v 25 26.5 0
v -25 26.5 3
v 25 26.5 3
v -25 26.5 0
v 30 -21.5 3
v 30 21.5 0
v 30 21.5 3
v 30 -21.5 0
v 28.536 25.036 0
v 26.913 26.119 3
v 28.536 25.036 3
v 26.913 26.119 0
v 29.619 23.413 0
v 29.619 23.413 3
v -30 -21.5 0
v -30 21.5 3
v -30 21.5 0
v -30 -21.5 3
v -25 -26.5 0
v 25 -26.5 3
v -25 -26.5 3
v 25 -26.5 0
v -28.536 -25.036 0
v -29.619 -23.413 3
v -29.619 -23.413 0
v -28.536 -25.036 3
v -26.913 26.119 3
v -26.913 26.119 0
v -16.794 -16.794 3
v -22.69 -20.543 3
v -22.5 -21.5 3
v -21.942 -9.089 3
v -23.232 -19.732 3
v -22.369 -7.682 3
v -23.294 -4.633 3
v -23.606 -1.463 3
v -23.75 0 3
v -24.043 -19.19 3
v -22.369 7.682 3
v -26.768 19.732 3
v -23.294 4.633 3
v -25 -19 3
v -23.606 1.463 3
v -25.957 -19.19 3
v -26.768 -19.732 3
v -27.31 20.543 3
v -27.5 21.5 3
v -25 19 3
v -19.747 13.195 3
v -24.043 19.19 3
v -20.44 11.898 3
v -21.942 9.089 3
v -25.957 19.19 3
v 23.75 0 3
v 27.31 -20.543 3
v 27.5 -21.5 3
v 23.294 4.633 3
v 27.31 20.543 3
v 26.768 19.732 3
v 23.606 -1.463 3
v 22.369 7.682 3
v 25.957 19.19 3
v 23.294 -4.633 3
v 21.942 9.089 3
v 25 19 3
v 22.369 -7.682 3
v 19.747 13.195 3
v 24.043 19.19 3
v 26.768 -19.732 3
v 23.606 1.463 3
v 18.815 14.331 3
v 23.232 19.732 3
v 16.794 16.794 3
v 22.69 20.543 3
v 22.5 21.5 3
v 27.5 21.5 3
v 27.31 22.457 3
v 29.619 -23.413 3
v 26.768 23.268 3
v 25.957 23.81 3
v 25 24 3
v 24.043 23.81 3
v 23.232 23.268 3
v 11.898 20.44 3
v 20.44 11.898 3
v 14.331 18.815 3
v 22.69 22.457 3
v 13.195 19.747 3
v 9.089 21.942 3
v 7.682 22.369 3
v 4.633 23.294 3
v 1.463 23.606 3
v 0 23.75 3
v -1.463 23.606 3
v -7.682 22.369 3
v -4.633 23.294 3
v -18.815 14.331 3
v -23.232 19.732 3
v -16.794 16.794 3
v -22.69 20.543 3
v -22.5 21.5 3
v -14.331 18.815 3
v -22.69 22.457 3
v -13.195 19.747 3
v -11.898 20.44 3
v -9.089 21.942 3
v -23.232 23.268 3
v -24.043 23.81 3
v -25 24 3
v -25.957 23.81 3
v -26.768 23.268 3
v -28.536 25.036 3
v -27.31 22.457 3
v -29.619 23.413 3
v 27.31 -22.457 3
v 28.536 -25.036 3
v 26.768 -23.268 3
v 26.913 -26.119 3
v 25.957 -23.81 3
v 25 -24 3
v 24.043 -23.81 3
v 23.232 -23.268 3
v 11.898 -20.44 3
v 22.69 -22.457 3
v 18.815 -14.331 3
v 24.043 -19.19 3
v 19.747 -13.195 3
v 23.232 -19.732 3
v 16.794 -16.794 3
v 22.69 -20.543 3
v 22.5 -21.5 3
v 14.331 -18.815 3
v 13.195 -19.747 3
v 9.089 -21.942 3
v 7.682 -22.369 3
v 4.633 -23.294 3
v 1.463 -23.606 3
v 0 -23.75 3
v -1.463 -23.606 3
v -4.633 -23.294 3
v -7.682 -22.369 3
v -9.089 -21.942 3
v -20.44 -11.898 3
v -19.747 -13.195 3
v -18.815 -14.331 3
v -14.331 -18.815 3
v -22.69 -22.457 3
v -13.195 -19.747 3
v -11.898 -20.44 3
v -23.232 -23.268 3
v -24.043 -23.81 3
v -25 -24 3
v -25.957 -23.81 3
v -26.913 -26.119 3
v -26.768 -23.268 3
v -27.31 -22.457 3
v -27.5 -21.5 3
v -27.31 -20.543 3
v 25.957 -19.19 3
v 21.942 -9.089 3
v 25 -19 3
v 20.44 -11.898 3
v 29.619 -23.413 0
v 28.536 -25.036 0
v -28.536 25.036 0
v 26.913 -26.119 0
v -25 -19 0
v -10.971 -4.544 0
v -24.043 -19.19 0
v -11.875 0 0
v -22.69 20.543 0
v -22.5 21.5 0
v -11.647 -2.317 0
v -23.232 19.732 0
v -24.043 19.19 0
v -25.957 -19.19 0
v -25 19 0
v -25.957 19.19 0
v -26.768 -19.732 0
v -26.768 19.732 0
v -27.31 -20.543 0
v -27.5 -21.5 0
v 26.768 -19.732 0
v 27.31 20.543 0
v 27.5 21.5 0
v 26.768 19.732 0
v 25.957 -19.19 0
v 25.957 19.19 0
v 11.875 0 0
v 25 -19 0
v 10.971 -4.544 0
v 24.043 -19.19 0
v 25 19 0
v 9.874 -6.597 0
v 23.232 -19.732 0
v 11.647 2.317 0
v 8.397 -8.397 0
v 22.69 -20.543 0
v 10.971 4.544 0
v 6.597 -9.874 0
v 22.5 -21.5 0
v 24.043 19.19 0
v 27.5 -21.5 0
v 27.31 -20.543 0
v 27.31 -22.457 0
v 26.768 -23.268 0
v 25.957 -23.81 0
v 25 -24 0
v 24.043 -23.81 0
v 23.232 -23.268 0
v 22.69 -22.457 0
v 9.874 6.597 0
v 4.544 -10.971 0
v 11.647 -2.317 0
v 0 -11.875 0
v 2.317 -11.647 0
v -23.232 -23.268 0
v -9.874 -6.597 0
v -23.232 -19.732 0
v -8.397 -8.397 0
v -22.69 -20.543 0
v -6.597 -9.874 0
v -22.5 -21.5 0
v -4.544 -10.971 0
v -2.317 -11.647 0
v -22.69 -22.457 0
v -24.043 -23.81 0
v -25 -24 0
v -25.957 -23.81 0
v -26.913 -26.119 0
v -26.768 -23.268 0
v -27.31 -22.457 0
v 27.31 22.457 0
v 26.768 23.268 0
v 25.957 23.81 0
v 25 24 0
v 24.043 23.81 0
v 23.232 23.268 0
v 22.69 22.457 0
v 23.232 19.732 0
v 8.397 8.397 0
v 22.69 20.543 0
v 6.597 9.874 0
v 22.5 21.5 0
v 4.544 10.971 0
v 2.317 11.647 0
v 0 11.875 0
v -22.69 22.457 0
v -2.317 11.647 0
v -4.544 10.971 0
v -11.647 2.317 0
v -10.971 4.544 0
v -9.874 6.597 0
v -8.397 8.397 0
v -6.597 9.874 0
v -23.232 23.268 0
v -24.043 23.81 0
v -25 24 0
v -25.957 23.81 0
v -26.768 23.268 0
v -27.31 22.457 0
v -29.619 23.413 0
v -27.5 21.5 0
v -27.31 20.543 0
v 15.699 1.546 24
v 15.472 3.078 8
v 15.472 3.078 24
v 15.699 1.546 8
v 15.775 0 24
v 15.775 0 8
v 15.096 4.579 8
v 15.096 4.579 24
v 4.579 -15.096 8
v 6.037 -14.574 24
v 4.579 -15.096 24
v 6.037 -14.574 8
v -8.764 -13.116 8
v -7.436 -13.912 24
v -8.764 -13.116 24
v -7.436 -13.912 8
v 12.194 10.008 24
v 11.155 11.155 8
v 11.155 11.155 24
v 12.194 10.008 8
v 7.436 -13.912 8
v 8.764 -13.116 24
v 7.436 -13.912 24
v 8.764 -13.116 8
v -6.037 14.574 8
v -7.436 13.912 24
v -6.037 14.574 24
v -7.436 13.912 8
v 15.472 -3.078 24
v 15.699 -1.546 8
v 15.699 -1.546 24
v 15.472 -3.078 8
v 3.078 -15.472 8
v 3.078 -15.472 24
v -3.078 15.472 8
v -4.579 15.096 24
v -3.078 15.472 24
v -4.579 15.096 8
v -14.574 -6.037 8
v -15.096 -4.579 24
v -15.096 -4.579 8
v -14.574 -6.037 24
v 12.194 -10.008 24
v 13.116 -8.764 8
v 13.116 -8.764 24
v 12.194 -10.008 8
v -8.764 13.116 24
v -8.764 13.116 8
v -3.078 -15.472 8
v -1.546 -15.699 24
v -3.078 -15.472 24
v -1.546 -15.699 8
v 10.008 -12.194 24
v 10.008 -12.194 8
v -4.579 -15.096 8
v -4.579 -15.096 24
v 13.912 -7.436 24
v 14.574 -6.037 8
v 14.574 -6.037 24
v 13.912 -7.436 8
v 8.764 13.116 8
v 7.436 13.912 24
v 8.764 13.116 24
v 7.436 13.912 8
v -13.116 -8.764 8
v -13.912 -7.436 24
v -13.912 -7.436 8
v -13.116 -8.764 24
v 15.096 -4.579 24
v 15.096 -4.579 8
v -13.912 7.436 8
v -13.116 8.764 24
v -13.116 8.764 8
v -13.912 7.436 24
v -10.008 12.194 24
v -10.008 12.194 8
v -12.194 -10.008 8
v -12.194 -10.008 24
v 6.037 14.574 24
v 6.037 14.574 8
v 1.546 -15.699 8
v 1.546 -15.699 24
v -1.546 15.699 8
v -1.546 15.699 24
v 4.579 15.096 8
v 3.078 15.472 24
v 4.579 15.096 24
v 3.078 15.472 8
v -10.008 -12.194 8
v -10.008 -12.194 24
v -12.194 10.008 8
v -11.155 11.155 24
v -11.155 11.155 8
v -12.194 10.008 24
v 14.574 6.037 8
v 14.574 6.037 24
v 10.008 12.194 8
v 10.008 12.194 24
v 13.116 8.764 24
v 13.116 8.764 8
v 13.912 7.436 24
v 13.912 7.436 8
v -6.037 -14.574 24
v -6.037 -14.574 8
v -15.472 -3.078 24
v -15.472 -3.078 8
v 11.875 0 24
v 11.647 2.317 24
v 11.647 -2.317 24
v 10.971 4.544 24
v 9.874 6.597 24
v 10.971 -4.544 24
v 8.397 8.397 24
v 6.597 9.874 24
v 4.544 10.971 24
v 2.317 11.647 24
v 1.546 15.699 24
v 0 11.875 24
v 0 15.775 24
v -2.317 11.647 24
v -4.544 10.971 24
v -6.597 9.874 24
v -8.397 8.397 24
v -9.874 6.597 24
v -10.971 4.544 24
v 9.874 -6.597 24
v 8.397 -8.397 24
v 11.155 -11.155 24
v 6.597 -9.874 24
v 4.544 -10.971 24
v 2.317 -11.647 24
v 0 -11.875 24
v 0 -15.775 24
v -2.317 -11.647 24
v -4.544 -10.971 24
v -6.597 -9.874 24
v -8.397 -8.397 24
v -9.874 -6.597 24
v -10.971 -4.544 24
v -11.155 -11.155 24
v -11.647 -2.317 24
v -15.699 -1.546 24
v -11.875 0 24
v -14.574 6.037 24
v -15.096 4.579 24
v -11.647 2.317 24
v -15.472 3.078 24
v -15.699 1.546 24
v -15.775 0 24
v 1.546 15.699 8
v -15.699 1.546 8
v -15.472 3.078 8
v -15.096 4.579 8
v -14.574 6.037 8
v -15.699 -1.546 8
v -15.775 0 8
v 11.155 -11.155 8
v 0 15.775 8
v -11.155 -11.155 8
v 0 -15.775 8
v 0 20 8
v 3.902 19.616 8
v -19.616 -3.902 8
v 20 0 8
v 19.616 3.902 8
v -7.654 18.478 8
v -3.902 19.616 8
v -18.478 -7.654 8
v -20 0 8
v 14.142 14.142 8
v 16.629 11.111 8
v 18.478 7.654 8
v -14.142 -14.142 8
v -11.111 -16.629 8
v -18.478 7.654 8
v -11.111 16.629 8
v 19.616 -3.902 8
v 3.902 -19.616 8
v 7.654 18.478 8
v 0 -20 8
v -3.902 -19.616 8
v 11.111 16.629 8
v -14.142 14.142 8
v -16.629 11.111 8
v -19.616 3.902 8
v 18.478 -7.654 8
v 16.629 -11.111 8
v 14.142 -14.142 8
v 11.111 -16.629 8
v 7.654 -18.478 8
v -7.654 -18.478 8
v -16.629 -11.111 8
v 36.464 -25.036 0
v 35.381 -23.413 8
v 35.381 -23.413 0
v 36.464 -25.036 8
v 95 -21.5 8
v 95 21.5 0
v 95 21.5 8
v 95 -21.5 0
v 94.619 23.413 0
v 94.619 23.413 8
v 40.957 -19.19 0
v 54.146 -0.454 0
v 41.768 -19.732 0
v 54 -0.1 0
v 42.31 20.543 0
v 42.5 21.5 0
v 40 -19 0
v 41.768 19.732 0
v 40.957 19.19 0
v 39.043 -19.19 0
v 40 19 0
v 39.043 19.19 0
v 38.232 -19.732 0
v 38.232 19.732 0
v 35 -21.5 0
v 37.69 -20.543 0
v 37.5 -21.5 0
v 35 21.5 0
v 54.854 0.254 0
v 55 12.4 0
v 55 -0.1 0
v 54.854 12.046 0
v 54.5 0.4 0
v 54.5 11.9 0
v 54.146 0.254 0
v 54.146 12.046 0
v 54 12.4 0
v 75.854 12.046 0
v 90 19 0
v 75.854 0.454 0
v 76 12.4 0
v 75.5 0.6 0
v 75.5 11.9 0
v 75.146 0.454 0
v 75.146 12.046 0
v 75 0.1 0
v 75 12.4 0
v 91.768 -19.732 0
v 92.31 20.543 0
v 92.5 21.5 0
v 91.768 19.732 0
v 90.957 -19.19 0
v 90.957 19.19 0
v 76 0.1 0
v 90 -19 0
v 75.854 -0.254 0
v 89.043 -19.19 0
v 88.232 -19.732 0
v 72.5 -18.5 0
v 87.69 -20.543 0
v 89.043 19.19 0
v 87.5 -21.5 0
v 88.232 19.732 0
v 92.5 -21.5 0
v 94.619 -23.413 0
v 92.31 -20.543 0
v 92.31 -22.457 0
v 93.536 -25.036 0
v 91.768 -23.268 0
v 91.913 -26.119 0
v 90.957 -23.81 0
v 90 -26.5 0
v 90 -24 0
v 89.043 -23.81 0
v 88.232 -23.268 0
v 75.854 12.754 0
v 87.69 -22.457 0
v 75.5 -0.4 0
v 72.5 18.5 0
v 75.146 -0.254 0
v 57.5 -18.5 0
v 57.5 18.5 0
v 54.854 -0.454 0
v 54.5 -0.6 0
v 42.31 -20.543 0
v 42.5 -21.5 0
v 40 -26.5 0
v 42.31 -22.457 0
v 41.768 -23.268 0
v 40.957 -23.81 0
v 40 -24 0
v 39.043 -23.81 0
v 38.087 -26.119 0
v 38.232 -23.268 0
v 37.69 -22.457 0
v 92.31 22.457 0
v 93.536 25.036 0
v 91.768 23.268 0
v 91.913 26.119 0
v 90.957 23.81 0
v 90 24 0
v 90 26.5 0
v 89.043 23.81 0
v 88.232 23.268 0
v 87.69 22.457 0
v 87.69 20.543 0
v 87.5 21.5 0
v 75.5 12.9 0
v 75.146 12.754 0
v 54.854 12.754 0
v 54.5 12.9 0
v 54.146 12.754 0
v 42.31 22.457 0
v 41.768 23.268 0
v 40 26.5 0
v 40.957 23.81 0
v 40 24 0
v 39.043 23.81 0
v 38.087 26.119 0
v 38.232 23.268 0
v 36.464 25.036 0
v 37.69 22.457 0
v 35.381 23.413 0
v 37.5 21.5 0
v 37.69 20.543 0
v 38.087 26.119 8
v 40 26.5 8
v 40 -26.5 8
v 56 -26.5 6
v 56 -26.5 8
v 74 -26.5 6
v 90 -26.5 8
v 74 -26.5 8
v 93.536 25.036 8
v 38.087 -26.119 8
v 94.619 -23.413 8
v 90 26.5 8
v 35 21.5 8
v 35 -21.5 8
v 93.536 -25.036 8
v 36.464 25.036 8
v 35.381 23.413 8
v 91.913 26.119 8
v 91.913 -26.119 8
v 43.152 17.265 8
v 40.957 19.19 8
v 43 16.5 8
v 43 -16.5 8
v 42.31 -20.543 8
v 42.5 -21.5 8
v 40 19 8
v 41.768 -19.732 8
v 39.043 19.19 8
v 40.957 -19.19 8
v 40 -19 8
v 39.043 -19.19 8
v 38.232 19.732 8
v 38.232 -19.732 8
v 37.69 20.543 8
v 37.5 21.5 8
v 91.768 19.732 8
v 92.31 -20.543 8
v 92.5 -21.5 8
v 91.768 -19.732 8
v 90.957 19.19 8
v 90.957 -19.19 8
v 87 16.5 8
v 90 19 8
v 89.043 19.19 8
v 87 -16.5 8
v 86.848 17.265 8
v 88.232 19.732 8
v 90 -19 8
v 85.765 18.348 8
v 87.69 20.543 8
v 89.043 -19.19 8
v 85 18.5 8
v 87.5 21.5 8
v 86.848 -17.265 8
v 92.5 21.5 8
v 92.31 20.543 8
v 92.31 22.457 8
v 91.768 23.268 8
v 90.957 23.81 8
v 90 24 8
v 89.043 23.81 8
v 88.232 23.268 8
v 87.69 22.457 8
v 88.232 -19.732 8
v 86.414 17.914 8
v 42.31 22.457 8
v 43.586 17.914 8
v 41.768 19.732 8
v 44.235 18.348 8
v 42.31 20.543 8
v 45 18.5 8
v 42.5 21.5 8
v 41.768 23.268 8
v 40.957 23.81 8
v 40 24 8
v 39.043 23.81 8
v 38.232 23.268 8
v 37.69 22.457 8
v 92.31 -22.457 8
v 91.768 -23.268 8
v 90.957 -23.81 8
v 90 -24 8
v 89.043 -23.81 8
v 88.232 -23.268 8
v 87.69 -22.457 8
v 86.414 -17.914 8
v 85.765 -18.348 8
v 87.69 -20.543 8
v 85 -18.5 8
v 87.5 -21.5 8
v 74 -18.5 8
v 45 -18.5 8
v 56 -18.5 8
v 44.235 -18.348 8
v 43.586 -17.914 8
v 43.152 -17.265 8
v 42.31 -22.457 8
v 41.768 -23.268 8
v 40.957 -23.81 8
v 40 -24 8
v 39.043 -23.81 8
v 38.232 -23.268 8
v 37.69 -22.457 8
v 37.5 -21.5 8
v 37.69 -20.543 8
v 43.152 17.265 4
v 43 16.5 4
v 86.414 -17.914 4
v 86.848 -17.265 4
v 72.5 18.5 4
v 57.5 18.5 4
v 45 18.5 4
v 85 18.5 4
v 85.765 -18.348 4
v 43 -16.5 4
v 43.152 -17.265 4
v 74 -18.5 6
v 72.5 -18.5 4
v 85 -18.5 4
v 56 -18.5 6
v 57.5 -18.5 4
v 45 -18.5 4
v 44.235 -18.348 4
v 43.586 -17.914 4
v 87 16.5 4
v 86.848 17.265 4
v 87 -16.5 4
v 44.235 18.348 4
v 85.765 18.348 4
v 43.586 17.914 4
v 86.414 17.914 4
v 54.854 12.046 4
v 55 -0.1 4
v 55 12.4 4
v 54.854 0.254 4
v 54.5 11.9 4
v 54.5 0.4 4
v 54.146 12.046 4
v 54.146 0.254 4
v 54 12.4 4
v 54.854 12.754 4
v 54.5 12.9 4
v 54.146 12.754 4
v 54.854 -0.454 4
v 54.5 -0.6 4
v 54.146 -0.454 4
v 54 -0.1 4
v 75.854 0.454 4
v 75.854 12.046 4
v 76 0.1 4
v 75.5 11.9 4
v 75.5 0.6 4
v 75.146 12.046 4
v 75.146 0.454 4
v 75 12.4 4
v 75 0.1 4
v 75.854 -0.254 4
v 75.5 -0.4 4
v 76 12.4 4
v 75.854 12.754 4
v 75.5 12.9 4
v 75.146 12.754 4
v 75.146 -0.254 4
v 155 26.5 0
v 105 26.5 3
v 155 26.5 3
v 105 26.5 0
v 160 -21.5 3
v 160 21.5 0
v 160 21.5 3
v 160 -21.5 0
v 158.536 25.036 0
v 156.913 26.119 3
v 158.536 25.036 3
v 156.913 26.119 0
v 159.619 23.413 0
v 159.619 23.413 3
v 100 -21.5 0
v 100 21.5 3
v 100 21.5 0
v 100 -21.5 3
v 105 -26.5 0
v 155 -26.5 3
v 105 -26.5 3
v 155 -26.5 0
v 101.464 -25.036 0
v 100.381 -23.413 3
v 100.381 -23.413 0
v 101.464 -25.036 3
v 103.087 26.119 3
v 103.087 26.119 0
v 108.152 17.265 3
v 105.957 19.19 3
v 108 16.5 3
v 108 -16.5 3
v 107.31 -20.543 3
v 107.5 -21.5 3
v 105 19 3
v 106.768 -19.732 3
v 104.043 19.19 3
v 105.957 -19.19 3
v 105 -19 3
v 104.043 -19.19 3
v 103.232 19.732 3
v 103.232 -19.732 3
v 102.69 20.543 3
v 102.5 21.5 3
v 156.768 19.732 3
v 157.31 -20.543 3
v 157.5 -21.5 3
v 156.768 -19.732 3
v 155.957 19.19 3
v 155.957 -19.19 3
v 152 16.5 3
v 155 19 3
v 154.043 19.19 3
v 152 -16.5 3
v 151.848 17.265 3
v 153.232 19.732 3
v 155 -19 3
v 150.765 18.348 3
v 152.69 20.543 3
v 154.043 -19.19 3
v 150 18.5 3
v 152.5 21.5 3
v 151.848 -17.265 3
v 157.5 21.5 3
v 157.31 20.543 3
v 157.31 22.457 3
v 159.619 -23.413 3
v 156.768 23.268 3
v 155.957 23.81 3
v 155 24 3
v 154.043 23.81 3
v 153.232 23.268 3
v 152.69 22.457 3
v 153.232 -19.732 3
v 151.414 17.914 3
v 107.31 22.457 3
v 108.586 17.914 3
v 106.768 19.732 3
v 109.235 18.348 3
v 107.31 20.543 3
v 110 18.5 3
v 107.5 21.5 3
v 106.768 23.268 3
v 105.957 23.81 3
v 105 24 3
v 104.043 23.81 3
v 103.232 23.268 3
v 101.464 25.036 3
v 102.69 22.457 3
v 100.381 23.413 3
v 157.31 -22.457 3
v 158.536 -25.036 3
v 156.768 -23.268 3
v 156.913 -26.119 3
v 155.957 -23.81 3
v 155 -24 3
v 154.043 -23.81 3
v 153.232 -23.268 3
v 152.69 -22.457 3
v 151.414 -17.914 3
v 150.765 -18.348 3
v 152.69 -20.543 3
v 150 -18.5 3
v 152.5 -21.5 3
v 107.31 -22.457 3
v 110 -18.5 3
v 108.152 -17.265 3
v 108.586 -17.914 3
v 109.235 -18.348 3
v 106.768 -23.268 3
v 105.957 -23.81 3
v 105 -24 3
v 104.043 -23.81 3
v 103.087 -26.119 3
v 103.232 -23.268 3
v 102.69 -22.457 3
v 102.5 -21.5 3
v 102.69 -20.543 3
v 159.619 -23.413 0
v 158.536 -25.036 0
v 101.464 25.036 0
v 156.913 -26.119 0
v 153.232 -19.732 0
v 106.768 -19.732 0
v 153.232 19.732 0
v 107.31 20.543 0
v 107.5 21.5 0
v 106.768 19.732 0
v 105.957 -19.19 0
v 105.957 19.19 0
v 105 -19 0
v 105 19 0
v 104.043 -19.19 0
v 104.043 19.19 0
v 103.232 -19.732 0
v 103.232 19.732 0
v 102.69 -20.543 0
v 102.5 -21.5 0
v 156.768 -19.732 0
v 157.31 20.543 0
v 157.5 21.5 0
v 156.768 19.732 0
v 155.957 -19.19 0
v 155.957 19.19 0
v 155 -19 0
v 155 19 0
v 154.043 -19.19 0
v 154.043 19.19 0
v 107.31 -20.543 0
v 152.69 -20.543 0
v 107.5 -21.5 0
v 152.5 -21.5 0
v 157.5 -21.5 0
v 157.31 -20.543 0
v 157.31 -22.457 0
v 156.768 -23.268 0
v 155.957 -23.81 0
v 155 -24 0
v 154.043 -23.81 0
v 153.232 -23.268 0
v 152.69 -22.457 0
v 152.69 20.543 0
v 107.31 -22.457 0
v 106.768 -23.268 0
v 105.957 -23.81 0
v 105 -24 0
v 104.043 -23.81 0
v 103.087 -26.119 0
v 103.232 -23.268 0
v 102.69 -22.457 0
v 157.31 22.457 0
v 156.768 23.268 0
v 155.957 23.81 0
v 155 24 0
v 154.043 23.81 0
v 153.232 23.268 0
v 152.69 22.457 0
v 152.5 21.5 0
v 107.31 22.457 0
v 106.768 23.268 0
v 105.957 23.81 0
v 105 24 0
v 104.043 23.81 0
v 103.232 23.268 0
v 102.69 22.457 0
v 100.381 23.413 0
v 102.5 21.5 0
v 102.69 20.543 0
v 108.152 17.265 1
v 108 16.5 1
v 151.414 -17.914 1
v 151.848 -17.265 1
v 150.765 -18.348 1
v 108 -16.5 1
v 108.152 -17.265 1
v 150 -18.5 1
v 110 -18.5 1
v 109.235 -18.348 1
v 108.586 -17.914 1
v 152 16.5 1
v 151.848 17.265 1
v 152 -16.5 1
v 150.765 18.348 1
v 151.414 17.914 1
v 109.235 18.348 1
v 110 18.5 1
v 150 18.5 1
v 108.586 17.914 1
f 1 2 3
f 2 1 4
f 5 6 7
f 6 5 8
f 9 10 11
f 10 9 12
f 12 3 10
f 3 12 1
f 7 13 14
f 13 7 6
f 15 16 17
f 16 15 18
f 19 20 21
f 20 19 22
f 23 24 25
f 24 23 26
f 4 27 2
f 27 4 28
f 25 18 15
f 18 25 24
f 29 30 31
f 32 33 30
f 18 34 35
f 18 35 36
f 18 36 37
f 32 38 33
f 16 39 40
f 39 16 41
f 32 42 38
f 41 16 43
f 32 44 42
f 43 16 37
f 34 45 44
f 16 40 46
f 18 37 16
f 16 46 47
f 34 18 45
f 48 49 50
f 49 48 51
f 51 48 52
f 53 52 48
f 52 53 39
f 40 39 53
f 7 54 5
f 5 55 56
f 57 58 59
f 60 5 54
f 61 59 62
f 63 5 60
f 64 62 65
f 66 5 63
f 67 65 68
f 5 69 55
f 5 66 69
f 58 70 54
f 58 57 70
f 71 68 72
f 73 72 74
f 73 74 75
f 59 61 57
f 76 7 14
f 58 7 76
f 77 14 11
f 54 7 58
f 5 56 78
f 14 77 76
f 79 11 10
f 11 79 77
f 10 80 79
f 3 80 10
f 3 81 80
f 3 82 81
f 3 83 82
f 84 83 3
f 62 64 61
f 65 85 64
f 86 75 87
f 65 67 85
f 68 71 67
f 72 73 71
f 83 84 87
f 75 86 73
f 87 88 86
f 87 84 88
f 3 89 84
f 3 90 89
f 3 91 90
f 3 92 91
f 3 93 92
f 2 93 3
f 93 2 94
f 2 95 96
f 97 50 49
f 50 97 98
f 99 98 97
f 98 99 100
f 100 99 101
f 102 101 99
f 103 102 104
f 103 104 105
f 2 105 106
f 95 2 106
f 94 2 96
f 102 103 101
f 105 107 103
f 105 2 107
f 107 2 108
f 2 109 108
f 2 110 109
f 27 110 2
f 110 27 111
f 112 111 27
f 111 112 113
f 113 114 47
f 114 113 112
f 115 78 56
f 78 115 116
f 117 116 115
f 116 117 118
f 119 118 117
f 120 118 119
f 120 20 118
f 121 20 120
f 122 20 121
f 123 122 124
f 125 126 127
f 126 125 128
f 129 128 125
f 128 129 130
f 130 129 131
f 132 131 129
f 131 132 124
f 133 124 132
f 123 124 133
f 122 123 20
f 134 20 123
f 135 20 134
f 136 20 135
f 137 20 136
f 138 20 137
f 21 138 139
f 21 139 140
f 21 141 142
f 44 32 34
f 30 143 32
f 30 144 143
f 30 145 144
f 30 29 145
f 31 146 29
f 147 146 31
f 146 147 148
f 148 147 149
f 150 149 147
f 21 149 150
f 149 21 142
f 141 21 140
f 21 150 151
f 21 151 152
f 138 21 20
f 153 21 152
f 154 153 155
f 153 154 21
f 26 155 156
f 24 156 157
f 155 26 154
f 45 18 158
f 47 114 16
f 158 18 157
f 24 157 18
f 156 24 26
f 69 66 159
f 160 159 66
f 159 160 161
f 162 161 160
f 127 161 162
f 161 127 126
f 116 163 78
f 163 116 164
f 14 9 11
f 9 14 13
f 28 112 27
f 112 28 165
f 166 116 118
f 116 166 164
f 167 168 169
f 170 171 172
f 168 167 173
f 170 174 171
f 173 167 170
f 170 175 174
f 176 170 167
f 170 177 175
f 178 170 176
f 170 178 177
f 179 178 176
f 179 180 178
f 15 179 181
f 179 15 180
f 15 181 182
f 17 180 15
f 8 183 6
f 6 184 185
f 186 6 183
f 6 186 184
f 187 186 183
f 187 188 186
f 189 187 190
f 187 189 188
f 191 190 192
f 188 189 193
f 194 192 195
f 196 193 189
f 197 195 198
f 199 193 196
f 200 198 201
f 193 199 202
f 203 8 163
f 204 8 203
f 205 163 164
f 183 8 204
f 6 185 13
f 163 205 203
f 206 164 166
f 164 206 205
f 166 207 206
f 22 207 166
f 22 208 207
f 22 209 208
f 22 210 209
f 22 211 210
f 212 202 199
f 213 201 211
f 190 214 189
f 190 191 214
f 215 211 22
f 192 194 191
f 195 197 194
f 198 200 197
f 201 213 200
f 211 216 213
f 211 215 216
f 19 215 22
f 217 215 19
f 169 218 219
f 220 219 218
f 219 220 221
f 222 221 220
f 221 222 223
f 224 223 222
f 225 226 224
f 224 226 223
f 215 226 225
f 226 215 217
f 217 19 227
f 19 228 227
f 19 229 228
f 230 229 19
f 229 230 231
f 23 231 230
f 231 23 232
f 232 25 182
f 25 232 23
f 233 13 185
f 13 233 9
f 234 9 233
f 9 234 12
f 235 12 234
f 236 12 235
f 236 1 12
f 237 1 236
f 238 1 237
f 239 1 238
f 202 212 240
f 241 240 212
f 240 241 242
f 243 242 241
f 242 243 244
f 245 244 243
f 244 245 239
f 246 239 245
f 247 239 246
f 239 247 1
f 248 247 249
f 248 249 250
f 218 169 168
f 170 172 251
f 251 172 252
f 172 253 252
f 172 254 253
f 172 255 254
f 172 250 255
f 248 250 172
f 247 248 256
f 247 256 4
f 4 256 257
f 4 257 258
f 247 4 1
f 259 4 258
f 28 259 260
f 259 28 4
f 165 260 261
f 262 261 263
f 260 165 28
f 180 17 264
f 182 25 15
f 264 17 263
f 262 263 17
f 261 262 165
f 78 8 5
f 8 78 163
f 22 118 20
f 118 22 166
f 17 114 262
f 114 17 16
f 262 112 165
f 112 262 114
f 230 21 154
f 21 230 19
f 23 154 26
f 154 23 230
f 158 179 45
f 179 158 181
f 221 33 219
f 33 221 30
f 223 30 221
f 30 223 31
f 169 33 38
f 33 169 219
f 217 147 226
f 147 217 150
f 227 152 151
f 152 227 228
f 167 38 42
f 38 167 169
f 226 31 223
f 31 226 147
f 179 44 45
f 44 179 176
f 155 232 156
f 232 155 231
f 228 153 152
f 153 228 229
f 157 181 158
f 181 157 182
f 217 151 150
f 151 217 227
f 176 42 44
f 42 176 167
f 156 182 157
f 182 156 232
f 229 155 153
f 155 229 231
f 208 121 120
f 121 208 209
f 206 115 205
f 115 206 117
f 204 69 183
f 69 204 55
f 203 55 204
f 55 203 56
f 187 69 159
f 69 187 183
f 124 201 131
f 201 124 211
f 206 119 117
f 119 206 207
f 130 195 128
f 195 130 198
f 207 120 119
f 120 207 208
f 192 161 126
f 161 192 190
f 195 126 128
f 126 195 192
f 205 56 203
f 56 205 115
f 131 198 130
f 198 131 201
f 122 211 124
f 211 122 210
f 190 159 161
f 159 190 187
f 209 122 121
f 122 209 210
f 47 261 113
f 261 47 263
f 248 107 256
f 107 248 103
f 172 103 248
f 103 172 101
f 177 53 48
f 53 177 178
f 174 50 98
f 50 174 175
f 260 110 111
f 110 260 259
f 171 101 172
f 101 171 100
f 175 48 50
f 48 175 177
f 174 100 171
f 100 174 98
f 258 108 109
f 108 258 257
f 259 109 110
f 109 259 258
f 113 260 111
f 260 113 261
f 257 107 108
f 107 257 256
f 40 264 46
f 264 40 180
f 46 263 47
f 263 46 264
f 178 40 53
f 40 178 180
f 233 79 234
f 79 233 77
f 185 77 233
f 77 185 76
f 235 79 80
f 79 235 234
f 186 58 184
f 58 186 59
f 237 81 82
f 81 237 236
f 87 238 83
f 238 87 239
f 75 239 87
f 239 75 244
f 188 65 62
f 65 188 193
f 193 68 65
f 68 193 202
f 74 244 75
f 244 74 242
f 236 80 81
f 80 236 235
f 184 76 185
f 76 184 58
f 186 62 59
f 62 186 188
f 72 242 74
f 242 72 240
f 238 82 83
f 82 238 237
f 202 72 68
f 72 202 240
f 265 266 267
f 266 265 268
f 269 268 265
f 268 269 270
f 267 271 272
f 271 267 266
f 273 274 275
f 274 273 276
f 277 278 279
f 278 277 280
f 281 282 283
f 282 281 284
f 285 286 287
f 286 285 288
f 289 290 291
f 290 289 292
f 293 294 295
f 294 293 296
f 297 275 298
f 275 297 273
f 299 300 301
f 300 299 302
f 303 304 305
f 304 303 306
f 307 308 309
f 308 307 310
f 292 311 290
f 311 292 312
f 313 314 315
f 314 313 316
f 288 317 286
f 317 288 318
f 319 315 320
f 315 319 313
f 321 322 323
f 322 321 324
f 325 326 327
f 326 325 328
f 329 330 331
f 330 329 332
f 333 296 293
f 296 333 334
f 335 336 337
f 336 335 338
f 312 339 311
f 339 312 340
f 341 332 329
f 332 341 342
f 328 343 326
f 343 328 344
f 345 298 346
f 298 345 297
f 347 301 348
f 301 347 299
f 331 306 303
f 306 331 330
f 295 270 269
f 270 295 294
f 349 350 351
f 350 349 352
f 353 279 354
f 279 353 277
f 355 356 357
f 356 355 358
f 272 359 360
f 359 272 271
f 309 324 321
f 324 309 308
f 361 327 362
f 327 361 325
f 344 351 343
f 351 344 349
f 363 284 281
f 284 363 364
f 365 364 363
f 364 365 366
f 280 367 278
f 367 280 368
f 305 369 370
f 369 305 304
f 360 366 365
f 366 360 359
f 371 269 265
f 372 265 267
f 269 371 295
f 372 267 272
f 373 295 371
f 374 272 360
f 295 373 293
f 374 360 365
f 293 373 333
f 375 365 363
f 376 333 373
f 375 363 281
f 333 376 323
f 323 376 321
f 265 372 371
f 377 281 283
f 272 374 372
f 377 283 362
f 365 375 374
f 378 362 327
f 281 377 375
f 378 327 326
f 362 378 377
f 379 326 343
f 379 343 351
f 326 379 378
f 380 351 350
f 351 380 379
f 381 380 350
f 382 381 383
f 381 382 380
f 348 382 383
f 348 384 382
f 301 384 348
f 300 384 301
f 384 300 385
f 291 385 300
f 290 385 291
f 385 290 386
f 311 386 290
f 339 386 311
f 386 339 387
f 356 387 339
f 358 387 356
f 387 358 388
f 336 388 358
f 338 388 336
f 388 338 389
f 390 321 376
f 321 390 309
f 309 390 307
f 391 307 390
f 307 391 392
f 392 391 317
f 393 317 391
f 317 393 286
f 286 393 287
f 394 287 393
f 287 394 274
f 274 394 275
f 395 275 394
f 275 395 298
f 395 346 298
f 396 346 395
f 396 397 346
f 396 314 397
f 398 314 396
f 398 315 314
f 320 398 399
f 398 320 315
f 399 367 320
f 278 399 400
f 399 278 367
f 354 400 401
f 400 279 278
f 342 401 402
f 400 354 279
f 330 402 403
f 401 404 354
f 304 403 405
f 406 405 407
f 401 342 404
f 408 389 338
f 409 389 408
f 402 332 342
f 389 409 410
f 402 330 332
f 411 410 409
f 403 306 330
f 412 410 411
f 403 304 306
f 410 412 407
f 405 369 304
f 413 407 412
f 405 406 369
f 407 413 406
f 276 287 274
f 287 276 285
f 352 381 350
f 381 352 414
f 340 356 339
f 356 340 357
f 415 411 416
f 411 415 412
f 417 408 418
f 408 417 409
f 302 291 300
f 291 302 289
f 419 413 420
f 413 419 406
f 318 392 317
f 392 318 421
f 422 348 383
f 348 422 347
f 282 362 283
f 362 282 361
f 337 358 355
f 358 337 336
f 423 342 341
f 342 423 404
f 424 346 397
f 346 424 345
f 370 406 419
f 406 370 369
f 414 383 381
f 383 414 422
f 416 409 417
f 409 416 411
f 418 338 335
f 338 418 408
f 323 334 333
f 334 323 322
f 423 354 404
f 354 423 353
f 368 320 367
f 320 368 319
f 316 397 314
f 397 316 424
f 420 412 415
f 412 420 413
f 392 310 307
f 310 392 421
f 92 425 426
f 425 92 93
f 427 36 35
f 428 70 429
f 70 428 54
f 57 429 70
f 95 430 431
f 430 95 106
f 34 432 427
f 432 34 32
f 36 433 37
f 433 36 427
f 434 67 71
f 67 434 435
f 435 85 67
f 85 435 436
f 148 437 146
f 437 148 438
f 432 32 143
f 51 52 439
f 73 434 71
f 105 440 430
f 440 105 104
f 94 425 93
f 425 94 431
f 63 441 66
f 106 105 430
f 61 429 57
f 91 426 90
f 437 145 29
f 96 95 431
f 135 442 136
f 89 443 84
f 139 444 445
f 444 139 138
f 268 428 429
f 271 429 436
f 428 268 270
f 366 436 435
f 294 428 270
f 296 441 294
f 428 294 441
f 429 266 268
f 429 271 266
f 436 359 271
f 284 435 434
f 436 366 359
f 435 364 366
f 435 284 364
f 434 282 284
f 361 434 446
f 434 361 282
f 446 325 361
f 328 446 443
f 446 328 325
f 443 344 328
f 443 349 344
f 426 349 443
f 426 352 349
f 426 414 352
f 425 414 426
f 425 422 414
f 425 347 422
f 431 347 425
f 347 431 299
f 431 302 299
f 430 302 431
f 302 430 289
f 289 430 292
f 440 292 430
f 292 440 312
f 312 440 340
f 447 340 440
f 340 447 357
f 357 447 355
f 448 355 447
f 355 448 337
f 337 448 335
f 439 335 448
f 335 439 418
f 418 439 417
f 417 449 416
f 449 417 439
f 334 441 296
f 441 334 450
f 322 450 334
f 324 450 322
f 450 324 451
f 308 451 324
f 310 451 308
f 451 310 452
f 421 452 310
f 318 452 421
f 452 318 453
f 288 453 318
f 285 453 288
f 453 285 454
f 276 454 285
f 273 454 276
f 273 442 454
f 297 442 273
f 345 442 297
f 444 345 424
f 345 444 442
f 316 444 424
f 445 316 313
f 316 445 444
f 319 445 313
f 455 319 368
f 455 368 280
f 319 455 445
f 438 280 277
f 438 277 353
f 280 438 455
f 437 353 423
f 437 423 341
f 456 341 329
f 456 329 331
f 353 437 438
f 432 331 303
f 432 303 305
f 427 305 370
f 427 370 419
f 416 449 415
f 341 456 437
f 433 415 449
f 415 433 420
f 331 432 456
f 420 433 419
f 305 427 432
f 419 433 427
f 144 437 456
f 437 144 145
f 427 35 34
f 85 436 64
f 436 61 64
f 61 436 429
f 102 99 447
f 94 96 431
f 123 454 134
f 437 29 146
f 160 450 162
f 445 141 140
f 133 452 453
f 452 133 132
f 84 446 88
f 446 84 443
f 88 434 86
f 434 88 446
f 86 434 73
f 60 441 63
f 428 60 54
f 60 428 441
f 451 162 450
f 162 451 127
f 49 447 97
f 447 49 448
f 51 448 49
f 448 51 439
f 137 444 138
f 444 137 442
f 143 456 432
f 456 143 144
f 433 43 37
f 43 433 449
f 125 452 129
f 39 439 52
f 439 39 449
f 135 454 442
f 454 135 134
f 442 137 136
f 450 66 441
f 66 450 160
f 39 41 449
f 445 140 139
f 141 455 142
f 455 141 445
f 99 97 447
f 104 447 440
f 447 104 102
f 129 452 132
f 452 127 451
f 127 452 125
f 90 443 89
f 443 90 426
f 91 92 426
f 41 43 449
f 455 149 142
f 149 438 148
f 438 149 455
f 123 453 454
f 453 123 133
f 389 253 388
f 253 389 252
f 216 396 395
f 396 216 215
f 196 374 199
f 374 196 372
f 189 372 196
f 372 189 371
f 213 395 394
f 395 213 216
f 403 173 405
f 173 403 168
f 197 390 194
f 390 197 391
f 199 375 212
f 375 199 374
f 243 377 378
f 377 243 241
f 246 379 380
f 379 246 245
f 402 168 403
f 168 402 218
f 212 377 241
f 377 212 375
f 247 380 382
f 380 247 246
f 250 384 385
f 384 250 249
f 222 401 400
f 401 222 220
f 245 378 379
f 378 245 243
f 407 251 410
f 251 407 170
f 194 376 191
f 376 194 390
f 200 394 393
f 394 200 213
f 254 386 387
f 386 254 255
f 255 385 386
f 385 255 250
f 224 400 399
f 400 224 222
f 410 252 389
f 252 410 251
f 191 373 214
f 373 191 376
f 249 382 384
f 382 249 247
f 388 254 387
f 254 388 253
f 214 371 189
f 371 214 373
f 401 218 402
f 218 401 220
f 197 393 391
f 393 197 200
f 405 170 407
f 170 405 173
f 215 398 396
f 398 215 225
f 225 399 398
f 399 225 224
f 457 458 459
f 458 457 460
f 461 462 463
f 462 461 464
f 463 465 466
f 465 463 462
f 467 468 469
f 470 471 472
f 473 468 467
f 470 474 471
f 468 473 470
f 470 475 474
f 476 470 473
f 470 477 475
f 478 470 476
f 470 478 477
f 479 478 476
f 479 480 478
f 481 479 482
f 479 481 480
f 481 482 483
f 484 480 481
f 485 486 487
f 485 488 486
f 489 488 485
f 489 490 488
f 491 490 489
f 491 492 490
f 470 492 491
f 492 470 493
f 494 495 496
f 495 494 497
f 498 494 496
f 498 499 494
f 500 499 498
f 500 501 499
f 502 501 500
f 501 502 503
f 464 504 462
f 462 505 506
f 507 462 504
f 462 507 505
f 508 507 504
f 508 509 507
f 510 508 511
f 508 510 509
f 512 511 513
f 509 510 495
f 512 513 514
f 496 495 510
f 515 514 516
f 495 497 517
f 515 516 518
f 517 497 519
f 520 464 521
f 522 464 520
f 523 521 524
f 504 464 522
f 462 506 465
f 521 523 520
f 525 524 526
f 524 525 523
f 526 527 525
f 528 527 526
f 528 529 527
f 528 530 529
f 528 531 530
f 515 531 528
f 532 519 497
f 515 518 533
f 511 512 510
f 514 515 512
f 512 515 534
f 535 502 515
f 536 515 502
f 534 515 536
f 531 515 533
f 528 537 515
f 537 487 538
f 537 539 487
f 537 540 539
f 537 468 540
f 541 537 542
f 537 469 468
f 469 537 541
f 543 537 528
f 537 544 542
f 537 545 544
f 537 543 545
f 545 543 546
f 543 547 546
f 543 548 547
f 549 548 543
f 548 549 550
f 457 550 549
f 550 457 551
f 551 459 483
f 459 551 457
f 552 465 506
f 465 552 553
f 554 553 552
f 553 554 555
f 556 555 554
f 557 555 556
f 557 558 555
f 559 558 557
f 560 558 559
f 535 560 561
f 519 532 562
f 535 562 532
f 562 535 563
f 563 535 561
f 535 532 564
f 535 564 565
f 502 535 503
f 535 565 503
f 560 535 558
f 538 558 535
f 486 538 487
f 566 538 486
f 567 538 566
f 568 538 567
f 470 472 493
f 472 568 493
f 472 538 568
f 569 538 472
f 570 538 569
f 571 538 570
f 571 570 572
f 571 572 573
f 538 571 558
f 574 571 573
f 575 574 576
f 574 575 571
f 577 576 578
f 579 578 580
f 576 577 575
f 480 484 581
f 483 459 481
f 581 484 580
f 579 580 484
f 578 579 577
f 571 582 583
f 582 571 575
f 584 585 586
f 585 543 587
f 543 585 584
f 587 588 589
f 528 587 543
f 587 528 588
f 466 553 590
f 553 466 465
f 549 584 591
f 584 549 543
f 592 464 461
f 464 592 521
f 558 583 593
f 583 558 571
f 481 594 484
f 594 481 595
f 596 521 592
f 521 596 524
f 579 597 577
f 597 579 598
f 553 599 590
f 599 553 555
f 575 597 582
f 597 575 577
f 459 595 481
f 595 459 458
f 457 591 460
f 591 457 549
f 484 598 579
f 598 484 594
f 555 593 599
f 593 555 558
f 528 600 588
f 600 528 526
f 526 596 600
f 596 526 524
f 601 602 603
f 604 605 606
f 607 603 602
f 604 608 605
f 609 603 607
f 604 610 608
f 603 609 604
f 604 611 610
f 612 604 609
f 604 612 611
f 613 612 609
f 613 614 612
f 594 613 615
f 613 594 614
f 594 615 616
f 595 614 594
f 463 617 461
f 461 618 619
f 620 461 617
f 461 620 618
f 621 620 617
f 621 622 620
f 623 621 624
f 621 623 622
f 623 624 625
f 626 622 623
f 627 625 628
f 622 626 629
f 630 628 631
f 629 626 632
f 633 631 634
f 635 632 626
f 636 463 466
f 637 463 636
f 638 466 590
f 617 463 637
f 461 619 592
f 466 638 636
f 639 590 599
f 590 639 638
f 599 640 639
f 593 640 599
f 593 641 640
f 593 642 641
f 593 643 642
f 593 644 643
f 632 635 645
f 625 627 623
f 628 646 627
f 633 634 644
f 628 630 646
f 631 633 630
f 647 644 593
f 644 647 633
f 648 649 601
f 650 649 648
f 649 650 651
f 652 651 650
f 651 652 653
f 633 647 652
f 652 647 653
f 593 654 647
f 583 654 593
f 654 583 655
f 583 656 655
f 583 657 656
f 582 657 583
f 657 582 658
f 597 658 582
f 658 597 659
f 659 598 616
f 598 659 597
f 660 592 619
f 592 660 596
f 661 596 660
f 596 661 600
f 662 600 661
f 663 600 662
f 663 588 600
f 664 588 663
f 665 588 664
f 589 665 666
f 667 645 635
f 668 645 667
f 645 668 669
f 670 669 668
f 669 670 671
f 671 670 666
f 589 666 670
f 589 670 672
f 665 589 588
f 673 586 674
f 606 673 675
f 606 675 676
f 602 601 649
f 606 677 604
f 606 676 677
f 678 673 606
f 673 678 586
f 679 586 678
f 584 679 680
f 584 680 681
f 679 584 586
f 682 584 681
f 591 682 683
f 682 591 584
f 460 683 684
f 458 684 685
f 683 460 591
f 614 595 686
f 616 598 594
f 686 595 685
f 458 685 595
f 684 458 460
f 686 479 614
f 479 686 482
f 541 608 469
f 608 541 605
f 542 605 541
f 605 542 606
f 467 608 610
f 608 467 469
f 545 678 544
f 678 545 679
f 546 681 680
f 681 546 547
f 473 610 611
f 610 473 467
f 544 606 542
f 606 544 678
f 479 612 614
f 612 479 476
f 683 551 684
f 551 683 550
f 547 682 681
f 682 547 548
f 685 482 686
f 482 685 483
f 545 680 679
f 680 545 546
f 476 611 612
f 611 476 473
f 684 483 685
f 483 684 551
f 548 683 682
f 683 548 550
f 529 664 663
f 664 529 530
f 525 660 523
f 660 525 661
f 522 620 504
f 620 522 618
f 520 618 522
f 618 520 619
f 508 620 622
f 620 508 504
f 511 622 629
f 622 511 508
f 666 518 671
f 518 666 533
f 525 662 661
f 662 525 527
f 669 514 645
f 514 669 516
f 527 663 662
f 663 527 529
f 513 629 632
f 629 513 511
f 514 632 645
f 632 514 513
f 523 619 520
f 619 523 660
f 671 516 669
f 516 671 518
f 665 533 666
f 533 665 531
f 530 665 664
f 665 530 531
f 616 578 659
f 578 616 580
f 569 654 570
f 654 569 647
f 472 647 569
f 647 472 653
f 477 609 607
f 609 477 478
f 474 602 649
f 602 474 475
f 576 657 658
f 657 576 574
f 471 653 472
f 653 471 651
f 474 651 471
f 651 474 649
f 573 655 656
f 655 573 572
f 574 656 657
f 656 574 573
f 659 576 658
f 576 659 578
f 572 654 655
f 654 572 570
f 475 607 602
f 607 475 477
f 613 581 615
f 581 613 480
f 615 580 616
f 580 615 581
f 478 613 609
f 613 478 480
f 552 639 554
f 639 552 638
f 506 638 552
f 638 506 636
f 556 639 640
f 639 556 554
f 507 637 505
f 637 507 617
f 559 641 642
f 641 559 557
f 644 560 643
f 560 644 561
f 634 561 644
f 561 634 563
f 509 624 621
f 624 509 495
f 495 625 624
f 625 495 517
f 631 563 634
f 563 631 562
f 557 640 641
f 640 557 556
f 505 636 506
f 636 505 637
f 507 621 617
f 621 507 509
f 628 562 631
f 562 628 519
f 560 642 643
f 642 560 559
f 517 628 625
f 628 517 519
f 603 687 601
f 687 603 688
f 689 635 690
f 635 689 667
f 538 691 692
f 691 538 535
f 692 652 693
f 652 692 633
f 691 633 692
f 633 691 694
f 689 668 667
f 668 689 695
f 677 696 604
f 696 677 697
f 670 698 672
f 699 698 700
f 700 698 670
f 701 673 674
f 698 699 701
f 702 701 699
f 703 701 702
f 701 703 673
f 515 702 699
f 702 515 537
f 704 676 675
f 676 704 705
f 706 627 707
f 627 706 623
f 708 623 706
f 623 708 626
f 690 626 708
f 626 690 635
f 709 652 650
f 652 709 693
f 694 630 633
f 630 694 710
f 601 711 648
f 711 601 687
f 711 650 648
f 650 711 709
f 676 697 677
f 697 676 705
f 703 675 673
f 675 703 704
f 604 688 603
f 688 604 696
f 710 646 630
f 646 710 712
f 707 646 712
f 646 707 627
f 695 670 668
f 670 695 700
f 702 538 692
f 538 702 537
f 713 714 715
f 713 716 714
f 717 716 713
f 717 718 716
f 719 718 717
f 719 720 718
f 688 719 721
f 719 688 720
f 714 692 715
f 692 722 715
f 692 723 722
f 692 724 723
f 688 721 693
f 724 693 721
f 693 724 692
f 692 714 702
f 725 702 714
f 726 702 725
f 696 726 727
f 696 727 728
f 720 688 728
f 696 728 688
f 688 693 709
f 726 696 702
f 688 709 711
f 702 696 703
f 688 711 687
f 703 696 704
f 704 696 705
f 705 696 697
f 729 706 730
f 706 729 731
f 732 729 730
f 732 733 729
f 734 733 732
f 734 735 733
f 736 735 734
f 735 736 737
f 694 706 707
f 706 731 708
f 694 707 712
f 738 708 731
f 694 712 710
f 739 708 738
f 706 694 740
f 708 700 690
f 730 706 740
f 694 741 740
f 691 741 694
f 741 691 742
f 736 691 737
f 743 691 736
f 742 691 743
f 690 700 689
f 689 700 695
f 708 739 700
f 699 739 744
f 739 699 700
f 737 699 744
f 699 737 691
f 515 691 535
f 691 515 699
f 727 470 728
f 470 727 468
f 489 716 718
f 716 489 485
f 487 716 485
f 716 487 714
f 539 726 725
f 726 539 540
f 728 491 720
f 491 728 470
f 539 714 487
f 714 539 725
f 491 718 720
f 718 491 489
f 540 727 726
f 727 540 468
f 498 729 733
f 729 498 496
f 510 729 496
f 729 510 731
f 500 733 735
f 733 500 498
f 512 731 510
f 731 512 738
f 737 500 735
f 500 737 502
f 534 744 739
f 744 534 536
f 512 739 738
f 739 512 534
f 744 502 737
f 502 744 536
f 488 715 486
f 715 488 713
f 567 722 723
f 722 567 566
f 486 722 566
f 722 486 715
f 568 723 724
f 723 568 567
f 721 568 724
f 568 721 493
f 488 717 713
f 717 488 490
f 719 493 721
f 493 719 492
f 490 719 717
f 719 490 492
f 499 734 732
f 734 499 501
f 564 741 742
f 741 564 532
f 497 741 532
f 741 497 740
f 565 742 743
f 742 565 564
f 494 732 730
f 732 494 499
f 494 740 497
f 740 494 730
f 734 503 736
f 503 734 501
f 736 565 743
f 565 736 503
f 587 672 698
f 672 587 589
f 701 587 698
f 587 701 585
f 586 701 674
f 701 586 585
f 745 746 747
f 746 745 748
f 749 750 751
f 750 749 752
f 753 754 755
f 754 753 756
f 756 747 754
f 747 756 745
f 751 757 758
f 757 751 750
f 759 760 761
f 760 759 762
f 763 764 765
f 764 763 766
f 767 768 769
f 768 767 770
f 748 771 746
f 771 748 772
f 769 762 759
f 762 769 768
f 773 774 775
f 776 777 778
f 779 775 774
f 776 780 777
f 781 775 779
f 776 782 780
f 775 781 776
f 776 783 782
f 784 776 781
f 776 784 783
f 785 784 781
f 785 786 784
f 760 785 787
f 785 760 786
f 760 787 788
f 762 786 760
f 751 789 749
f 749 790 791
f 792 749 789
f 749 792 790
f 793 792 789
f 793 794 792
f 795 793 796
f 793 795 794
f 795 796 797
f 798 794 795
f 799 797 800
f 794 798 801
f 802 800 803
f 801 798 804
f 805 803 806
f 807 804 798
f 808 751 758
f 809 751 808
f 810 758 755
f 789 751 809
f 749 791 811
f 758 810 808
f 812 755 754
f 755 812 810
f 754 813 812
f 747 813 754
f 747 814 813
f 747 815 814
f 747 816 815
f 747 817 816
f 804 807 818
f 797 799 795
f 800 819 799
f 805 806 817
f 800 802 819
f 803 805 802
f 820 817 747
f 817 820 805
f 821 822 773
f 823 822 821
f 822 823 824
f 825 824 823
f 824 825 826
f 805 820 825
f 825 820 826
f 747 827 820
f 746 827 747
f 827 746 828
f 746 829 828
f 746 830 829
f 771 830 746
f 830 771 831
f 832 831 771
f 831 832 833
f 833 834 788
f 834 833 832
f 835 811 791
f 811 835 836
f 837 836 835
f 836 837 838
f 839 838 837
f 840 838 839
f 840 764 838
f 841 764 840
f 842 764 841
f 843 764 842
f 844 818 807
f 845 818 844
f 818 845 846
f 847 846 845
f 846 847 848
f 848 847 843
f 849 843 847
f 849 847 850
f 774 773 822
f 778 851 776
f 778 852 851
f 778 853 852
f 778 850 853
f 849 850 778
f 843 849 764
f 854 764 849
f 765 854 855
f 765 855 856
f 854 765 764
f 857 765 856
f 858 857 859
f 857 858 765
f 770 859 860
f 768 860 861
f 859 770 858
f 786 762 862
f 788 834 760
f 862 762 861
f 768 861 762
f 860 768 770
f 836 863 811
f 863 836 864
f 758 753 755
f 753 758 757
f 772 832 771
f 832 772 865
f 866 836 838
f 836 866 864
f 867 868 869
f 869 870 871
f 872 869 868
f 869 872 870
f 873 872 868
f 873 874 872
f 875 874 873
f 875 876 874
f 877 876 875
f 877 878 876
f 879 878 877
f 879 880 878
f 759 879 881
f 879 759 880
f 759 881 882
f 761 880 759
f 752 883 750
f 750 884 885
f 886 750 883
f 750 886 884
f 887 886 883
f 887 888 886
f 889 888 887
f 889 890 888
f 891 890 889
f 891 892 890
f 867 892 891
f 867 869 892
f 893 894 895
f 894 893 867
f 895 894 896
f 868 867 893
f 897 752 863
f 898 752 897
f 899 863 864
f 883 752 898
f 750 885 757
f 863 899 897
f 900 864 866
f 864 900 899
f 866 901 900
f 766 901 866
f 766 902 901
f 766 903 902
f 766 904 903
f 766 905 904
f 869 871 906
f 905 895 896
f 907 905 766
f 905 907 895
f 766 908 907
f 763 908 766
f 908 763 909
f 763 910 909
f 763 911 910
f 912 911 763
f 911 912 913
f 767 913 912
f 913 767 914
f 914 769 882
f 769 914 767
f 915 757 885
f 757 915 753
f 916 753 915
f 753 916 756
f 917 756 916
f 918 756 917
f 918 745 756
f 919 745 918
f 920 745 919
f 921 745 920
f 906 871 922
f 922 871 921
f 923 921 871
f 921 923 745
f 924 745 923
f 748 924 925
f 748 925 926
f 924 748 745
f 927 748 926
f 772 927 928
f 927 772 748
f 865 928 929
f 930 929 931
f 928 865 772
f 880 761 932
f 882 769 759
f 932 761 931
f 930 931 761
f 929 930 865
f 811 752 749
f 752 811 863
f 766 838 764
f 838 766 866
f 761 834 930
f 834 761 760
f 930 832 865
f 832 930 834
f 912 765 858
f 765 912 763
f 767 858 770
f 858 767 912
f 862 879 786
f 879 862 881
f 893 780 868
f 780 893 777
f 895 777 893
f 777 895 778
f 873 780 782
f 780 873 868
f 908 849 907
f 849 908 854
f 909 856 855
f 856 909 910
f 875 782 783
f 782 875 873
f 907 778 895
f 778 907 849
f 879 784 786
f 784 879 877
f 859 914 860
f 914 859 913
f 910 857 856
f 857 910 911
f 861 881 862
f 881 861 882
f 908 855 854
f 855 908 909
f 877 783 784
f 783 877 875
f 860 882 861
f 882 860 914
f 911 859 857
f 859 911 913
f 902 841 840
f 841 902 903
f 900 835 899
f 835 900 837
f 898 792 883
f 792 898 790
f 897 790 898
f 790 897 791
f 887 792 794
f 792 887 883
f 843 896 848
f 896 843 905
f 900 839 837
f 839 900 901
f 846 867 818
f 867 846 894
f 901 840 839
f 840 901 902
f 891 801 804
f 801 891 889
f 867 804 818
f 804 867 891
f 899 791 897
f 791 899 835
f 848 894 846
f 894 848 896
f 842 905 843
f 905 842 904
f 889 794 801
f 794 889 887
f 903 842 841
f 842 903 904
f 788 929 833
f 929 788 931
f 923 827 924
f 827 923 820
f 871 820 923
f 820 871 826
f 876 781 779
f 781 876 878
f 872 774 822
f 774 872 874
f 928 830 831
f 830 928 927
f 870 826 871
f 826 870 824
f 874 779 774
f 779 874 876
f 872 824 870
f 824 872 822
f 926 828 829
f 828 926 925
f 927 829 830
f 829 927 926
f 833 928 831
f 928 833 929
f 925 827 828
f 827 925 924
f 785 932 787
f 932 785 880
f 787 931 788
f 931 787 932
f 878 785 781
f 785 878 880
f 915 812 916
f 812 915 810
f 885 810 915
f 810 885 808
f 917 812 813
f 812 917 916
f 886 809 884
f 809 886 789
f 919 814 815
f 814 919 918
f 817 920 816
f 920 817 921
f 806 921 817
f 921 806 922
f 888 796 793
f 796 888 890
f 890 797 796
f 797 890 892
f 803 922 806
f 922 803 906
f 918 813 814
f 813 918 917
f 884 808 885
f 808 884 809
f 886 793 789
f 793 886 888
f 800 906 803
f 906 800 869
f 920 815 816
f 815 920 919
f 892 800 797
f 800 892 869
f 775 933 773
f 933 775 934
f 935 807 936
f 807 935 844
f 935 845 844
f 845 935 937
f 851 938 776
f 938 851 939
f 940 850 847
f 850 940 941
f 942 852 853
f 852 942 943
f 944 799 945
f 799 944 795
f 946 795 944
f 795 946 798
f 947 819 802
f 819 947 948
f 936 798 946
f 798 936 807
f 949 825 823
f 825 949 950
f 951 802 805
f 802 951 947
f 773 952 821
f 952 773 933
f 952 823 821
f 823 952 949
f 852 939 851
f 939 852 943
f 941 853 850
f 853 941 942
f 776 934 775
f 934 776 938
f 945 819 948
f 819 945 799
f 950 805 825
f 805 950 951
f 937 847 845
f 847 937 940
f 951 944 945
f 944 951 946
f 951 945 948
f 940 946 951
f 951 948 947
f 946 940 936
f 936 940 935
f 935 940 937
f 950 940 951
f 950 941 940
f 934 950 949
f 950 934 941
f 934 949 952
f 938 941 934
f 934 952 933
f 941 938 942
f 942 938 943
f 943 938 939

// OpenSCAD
/*
 * Copyright (C) 2019 Marco Lochen
 *
 * This work is licensed under the Creative Commons Attribution 4.0
 * International License. To view a copy of this license, visit
 * http://creativecommons.org/licenses/by/4.0/ or send a letter to Creative
 * Commons, PO Box 1866, Mountain View, CA 94042, USA.
 */

qinch = 25.4 * 1.25;
width = 60;
height = 53;

module rounded_cube(x, y, z, r)
{
    hull()
    {
        translate([-x / 2 + r, -y / 2 + r, 0]) cylinder(r = r, h = z, $fn = 16);
        translate([x / 2 - r, -y / 2 + r, 0]) cylinder(r = r, h = z, $fn = 16);
        translate([-x / 2 + r, y / 2 - r, 0]) cylinder(r = r, h = z, $fn = 16);
        translate([x / 2 - r, y / 2 - r, 0]) cylinder(r = r, h = z, $fn = 16);
    }
}

module case_layer(h)
{
    difference()
    {
        rounded_cube(width, height, h, 5);
        translate([-width / 2 + 5, -height / 2 + 5, -1]) cylinder(r = 2.5, h = h + 2, $fn = 16);
        translate([width / 2 - 5, -height / 2 + 5, -1]) cylinder(r = 2.5, h = h + 2, $fn = 16);
        translate([-width / 2 + 5, height / 2 - 5, -1]) cylinder(r = 2.5, h = h + 2, $fn = 16);
        translate([width / 2 - 5, height / 2 - 5, -1]) cylinder(r = 2.5, h = h + 2, $fn = 16);
    }
}

module front()
{
    difference()
    {
        union()
        {
            cylinder(r = qinch / 2 - 0.1, h = 24, $fn = 64);
            cylinder(r1 = 26, r2 = 20, h = 8, $fn = 32);
            case_layer(3);
        }
        cylinder(r = qinch / 2 - 4, h = 100, $fn = 32, center = true);
    }
}

module middle()
{
    difference()
    {
        union()
        {
            difference()
            {
                case_layer(8);
                translate([0, 0, -1]) rounded_cube(44, 37, 12, 2);
            }
            translate([-15.5, 0, 2]) cube([16, 38, 4], center = true);
            translate([15.5, 0, 2]) cube([16, 38, 4], center = true);
        }
        translate([-10.5, -0.1, 0]) cylinder(r = 0.5, h = 20, $fn = 8, center = true);
        translate([10.5, 0.1, 0]) cylinder(r = 0.5, h = 20, $fn = 8, center = true);
        translate([-10.5, 12.4, 0]) cylinder(r = 0.5, h = 20, $fn = 8, center = true);
        translate([10.5, 12.4, 0]) cylinder(r = 0.5, h = 20, $fn = 8, center = true);
        
        translate([0, -20, 8]) cube([18, 20, 4], center = true);
    }
}

module back()
{
    difference()
    {
        case_layer(3);
        translate([0, 0, 1]) rounded_cube(44, 37, 12, 2);
    }
}

front();
translate([65, 0, 0]) middle();
translate([130, 0, 0]) back();
